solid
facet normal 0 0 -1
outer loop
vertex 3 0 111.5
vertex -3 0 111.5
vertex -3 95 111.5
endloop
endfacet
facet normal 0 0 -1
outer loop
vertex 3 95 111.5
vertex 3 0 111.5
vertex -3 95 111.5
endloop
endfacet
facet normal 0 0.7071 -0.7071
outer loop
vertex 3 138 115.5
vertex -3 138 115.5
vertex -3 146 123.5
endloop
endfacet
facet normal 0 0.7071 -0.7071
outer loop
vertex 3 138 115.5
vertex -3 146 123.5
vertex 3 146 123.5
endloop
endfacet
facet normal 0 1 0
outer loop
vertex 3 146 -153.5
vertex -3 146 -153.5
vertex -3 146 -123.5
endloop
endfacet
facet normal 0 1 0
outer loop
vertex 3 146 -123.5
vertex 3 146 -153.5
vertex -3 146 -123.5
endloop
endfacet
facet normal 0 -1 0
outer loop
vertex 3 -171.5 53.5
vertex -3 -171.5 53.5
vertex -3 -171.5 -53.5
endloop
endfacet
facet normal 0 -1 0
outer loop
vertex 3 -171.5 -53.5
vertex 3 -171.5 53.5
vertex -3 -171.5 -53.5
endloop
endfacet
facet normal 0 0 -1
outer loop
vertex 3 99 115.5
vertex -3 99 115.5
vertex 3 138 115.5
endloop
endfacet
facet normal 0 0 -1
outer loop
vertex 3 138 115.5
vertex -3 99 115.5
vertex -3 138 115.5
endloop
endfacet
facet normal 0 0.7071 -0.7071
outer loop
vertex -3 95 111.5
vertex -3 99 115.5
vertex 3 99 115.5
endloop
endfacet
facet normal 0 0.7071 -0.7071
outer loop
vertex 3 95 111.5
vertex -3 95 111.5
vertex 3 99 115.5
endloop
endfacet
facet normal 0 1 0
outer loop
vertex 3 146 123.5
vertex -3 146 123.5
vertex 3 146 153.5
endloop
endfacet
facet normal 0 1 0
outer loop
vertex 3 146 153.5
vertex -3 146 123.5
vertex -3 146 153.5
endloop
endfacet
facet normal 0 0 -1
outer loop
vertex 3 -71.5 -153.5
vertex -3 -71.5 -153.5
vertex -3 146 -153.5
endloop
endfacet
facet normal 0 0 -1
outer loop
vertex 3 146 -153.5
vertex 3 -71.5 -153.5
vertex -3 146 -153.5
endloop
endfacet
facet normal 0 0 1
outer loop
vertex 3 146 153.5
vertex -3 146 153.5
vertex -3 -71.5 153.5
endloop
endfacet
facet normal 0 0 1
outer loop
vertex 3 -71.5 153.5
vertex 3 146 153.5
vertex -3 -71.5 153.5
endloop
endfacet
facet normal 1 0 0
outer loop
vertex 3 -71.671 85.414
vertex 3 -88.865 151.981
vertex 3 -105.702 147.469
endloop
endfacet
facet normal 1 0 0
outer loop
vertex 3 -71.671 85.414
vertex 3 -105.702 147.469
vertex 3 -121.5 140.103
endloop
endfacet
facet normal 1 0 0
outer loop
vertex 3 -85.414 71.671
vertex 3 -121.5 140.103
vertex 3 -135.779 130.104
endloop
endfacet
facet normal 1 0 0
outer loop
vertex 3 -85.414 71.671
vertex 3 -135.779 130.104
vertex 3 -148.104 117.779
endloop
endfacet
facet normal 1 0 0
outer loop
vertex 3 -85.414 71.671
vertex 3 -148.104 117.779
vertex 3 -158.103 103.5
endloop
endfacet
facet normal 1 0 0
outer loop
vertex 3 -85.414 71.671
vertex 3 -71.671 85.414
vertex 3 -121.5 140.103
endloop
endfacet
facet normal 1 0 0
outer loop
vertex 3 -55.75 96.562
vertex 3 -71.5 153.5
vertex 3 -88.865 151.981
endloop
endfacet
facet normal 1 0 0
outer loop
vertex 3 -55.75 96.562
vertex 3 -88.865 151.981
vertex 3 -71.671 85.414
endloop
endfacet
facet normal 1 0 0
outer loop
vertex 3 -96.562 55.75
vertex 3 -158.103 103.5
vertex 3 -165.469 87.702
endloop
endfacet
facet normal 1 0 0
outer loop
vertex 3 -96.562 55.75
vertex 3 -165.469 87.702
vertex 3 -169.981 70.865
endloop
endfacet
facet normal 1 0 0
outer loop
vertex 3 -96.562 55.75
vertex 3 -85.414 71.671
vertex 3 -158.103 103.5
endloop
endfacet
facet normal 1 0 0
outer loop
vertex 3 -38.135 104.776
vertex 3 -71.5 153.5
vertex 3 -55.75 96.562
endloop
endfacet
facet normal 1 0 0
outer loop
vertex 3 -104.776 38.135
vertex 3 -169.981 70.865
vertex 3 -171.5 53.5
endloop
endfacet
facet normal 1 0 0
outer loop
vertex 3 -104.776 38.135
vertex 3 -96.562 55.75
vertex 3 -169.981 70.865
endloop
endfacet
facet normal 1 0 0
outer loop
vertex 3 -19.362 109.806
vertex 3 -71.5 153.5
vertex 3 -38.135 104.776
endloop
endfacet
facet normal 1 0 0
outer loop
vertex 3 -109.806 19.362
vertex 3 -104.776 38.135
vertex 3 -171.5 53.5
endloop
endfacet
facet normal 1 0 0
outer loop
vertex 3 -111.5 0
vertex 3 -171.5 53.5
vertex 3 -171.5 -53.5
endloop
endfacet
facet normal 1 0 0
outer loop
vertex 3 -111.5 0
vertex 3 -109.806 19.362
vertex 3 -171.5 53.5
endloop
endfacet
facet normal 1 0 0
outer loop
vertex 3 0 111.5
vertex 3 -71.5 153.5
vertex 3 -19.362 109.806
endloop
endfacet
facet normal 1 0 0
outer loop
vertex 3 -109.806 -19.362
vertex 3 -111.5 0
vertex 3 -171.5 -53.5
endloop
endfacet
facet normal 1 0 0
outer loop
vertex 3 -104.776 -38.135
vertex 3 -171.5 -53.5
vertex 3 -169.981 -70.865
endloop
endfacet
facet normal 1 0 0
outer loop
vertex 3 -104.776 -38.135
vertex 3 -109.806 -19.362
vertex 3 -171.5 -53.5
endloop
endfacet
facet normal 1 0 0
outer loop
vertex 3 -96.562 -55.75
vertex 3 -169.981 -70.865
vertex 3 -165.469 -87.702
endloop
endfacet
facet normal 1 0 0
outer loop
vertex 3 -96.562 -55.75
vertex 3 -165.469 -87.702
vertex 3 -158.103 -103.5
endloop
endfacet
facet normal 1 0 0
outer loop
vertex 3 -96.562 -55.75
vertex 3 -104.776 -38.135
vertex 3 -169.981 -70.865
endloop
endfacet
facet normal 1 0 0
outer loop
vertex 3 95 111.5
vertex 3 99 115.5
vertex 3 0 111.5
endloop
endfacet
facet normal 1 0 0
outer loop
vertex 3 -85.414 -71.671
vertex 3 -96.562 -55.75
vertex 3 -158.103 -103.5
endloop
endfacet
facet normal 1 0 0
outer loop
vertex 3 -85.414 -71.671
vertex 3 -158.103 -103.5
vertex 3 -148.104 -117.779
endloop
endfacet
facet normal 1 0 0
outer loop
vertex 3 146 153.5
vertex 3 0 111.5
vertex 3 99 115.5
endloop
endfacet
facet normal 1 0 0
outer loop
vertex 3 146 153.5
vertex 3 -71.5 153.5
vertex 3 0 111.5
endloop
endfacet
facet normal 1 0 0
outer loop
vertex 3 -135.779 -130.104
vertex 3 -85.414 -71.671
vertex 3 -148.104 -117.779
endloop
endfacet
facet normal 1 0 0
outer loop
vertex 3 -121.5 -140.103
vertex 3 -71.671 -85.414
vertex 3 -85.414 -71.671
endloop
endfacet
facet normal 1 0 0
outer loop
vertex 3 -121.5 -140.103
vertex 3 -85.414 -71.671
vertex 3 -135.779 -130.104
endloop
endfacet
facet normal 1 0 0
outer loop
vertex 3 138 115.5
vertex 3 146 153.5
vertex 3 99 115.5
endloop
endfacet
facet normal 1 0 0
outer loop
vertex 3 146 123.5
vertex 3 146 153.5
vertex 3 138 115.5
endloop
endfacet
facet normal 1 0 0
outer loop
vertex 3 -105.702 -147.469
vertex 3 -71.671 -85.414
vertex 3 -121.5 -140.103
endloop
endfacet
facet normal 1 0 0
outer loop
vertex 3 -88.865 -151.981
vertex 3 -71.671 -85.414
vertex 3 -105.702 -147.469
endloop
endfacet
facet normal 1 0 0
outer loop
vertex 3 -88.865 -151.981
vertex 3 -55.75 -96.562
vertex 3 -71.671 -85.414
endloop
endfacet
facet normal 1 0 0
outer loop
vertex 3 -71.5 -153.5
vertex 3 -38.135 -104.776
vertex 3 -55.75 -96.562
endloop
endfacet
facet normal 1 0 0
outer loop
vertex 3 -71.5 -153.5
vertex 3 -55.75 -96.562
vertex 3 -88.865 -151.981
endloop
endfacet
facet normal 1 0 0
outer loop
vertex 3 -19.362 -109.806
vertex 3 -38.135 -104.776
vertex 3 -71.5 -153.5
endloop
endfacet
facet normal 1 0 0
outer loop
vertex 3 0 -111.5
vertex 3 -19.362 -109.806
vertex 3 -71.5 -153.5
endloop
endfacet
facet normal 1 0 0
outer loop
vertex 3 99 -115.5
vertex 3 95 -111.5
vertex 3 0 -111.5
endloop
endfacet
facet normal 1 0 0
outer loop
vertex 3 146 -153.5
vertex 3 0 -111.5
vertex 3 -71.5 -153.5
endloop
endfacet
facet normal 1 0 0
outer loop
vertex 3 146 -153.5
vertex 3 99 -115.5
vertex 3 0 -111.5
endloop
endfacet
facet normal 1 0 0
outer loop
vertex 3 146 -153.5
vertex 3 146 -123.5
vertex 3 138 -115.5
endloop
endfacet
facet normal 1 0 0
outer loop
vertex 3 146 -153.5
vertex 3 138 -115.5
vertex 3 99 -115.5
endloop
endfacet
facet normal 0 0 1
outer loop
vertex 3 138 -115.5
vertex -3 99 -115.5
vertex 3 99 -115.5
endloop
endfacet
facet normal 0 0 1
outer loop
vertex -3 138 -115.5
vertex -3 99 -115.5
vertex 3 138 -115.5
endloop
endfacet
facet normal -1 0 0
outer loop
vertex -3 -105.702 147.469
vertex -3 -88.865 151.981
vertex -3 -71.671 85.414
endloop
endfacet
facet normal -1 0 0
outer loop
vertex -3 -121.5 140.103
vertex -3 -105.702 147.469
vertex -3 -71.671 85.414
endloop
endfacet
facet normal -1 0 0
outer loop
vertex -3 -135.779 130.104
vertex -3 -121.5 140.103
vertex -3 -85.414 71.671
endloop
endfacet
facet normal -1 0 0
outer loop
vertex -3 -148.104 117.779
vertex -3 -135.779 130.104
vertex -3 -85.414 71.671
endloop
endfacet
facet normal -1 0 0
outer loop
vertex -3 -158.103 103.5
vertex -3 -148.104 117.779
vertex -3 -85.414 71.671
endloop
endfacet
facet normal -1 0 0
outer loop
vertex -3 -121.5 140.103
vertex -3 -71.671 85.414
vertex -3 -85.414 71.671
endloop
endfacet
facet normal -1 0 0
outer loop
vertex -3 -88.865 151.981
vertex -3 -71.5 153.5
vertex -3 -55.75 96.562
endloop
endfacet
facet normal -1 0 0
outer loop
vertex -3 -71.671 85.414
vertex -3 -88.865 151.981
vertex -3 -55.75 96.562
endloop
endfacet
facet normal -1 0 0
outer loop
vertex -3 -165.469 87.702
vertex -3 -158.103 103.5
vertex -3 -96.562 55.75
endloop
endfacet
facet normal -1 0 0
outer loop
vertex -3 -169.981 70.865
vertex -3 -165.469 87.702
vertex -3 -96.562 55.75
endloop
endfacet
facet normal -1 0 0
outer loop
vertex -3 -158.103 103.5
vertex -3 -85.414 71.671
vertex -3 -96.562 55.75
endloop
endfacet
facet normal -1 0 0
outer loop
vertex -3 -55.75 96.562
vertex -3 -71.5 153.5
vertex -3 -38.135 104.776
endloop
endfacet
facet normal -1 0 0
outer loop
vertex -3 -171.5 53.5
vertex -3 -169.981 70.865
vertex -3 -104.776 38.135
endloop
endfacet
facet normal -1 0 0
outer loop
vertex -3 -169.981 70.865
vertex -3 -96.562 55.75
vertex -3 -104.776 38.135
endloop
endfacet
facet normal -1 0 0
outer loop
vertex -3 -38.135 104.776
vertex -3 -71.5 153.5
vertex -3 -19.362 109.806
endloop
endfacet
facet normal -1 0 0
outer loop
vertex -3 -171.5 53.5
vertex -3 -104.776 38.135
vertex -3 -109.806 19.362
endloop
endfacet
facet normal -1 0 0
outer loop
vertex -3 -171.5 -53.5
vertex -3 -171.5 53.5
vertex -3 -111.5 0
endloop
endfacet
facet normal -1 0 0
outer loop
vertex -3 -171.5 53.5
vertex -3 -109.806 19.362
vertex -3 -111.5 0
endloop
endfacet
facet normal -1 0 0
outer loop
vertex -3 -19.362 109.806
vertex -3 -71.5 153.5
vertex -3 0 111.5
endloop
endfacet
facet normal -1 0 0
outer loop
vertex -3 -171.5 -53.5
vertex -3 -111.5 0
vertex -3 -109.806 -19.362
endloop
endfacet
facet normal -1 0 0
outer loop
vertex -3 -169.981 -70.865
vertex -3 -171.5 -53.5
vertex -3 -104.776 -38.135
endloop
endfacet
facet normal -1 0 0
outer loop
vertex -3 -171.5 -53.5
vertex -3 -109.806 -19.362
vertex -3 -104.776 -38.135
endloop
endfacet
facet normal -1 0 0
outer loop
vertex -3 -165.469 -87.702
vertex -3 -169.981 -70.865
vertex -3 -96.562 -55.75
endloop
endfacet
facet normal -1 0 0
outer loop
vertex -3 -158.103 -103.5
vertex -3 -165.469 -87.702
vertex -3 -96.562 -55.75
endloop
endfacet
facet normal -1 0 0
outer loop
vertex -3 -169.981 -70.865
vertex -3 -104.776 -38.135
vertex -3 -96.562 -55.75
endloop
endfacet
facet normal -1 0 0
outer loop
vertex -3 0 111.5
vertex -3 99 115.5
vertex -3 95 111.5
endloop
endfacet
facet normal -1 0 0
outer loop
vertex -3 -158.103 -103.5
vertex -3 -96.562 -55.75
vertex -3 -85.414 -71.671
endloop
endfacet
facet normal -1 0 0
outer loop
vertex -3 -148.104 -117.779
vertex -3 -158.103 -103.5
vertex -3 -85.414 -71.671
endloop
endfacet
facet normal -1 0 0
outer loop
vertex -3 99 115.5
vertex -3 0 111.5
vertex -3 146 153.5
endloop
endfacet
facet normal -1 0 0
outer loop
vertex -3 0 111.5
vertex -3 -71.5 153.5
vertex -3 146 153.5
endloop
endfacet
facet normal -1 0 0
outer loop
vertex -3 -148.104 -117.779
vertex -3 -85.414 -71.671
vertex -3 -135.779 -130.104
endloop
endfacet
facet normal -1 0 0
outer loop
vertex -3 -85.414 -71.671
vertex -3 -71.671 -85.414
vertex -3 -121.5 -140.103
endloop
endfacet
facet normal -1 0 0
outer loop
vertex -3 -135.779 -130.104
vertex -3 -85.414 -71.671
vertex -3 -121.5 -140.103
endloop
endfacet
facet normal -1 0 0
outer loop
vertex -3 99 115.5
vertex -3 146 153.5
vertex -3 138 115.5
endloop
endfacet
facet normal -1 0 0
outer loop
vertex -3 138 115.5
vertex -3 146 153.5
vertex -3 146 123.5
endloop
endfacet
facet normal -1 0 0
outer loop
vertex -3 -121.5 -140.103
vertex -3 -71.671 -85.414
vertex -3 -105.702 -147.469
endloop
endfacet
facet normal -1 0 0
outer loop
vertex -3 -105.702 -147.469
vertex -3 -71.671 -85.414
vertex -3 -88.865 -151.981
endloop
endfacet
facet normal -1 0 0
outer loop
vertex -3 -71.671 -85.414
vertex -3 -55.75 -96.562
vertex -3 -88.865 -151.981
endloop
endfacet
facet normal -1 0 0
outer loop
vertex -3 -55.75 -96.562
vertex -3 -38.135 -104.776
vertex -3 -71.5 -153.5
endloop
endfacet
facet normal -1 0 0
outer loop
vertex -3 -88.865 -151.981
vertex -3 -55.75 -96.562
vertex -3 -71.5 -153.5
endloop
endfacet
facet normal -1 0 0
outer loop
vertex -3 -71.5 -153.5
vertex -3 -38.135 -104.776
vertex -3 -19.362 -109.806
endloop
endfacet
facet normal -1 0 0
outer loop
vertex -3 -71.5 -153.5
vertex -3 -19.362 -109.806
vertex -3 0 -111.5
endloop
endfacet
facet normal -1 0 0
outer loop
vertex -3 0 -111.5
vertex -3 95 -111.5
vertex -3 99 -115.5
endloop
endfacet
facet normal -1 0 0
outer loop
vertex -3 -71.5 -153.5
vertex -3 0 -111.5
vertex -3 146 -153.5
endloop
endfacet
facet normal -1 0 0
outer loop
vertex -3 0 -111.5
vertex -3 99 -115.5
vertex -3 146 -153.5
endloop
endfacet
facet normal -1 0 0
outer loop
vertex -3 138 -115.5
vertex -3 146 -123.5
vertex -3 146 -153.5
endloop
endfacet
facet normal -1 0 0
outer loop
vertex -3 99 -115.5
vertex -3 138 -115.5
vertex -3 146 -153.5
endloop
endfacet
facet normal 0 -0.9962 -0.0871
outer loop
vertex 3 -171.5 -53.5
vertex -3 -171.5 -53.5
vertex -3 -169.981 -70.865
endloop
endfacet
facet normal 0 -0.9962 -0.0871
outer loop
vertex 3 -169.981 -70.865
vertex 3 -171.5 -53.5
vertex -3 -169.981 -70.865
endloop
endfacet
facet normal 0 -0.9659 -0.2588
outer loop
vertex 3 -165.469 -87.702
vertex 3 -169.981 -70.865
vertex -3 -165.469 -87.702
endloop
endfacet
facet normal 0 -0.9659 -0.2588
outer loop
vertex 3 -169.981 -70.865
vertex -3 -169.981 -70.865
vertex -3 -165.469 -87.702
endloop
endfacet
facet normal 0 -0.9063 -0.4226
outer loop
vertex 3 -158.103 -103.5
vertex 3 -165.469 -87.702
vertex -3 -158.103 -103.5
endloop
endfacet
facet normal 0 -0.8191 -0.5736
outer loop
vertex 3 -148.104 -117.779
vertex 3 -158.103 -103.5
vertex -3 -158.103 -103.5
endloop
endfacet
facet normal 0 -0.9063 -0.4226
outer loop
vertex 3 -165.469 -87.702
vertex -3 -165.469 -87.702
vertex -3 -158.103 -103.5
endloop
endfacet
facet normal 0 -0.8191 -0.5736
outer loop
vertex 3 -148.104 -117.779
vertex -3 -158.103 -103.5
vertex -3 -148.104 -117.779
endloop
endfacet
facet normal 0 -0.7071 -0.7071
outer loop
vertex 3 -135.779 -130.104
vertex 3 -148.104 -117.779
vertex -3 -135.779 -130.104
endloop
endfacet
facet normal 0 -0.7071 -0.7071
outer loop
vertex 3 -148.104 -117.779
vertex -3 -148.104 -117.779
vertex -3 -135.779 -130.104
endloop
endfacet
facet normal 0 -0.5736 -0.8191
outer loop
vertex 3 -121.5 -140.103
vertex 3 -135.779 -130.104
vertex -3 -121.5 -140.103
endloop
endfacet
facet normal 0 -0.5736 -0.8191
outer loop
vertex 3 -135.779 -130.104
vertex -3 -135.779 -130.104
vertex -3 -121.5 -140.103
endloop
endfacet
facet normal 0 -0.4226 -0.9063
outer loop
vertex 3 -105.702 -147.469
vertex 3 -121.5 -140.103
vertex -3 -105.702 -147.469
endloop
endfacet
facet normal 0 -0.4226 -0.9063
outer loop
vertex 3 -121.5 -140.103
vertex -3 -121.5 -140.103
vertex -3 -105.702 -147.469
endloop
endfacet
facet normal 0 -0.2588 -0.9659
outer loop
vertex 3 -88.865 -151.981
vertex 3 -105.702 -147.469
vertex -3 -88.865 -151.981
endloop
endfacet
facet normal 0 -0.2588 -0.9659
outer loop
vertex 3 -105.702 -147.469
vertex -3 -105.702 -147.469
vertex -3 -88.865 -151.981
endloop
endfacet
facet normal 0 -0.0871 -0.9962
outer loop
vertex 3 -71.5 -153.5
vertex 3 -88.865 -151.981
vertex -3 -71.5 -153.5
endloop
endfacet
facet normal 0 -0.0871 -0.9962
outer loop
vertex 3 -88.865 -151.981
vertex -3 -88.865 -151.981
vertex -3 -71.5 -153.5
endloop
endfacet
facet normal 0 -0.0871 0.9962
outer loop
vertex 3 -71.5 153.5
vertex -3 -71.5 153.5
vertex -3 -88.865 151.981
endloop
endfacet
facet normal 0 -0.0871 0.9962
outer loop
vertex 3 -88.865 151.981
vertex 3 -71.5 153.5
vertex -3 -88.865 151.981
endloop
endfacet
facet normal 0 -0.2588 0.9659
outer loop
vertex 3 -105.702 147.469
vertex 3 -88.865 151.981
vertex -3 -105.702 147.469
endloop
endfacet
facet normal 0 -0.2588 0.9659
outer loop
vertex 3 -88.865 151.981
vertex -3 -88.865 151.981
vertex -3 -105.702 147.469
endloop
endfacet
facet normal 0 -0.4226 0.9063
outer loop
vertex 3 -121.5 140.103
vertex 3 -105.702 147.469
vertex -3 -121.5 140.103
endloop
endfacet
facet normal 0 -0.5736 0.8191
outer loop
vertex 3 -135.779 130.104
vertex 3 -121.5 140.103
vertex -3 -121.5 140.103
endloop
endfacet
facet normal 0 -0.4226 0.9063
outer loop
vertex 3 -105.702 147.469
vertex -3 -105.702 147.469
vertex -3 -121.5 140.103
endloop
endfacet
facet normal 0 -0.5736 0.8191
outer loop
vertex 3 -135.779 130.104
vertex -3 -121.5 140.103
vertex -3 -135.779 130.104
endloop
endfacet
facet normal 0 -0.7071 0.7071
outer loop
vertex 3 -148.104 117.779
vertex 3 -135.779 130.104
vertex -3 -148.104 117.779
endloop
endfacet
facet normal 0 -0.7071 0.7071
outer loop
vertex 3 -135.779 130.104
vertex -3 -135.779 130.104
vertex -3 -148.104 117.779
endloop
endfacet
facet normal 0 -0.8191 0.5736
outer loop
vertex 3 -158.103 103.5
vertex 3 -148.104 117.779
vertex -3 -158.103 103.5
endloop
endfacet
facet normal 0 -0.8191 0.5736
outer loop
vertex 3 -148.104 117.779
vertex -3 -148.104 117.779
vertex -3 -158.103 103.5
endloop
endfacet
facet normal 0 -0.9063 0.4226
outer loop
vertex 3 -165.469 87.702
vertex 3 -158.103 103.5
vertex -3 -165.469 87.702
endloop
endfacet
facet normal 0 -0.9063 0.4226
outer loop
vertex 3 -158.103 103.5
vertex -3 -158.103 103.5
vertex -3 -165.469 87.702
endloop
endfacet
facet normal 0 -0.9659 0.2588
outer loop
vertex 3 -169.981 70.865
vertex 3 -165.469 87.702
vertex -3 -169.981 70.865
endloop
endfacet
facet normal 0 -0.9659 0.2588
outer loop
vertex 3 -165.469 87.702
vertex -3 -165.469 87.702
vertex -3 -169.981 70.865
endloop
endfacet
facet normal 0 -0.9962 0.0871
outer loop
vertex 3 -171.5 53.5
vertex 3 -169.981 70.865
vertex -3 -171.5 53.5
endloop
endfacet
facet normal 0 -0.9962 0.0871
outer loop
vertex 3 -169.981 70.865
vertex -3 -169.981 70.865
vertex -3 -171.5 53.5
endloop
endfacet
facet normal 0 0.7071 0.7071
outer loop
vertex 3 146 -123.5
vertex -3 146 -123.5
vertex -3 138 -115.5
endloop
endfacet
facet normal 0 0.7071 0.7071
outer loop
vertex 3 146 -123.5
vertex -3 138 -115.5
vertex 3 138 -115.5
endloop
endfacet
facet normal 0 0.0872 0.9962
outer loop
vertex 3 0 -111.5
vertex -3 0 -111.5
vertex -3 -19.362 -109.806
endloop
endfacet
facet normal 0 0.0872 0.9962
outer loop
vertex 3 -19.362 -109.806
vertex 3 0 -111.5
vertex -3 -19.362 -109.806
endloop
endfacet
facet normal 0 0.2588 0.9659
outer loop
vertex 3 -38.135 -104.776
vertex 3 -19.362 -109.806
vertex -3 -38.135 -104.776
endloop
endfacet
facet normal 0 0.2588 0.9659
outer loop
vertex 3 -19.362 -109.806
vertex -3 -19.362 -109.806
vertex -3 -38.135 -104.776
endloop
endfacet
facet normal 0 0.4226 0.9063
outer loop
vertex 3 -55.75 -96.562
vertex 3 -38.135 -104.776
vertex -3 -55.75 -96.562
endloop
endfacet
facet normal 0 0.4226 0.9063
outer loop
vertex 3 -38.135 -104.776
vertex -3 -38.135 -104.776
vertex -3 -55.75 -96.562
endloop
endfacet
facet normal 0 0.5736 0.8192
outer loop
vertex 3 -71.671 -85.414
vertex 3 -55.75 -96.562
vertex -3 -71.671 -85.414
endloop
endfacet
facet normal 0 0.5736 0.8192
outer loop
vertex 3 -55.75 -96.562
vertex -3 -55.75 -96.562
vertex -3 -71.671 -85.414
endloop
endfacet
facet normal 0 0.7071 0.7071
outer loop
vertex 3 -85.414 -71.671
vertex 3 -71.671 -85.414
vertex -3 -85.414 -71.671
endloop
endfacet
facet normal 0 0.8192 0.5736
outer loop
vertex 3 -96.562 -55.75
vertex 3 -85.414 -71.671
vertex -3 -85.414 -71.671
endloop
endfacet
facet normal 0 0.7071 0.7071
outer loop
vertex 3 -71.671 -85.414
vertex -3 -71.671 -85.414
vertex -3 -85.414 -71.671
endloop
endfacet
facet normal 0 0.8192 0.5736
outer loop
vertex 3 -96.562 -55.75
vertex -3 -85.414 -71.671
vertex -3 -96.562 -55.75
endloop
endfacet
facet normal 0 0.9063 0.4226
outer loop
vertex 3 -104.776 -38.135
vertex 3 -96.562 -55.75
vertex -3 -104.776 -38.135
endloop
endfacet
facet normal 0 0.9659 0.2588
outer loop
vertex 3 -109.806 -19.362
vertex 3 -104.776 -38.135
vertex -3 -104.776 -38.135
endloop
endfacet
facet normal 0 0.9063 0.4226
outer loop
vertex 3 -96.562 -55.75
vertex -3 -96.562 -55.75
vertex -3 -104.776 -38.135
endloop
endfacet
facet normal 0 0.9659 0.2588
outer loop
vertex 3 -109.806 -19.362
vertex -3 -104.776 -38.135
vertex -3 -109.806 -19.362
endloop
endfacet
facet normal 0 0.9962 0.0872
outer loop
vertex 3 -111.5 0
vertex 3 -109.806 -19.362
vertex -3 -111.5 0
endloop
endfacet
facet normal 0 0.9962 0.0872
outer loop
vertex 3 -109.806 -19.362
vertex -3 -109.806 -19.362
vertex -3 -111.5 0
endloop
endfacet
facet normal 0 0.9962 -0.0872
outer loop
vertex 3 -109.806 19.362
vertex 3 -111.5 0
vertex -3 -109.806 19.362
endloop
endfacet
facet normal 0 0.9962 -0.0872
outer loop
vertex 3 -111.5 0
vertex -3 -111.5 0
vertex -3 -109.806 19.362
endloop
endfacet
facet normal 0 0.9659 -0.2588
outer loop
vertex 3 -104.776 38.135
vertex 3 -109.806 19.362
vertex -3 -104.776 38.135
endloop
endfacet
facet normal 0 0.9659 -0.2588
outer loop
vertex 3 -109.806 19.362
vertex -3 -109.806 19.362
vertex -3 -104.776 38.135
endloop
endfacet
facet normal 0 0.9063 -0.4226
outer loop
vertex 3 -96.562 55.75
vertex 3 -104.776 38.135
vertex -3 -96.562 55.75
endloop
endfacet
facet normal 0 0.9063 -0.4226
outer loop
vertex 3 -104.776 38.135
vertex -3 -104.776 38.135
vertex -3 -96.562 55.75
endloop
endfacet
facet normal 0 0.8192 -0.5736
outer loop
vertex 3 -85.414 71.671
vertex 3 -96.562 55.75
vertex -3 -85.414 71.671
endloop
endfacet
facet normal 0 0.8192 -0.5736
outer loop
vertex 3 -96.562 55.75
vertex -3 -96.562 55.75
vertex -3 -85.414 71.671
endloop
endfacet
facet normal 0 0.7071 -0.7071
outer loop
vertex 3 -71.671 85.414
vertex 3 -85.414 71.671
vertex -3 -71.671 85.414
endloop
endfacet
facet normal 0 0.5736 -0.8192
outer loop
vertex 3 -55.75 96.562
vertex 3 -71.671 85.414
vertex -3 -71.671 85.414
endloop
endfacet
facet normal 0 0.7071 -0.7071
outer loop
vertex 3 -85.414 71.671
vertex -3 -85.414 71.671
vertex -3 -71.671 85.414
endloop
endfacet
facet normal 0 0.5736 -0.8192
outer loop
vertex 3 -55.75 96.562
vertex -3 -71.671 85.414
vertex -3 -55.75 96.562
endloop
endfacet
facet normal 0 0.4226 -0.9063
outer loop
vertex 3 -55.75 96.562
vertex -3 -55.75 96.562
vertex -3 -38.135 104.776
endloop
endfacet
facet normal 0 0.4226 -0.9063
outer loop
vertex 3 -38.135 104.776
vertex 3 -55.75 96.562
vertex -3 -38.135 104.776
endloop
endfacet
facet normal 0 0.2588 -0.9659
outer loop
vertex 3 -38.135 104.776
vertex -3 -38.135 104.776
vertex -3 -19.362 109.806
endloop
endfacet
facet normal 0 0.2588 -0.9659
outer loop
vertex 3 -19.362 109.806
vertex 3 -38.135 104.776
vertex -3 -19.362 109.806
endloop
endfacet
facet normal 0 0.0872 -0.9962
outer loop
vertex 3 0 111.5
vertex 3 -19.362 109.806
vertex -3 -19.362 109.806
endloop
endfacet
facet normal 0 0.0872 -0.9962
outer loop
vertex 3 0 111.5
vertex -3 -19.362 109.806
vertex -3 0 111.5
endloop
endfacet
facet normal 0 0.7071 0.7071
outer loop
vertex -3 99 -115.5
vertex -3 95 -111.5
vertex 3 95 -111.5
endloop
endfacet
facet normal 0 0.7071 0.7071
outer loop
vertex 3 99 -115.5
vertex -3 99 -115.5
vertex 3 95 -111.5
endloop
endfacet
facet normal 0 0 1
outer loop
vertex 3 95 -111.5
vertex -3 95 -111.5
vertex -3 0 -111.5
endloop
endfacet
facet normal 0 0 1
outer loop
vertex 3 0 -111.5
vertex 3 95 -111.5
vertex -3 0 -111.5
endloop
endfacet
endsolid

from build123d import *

# Parameters (mm, degrees)
SM_START                 = -3
SM_BASE_FLANGE_1_DEPTH   = 6
CUT_EXTRUDE_1_DEPTH      = 231.181450165
CUT_EXTRUDE_1_DEPTH_BACK = 231.181450165
SKETCH_7_W               = 4
SKETCH_7_H               = 47
CHAMFER_2_SIZE           = 8
CHAMFER_3_SIZE           = 4


# Read off the part's stored shape, not the designer's step: Базовая кромка1
with BuildPart() as part:
    # Базовая кромка1 outline → Базовая кромка1 (new body)
    with BuildSketch(Plane(origin=(0, 0, 0), x_dir=(0, 0, -1), z_dir=(1, 0, 0)).offset(SM_START)):
        with BuildLine():
            Line((-111.5, 0), (-111.5, 146))
            Line((-111.5, 146), (-153.5, 146))
            Line((-153.5, 146), (-153.5, -71.5))
            ThreePointArc((-153.5, -71.5), (-124.210678119, -142.210678119), (-53.5, -171.5))
            Line((-53.5, -171.5), (53.5, -171.5))
            ThreePointArc((53.5, -171.5), (124.210678119, -142.210678119), (153.5, -71.5))
            Line((153.5, -71.5), (153.5, 146))
            Line((153.5, 146), (111.5, 146))
            Line((111.5, 146), (111.5, 0))
            ThreePointArc((111.5, 0), (0, -111.5), (-111.5, 0))
        make_face()
    extrude(amount=SM_BASE_FLANGE_1_DEPTH)

    # Эскиз7 → Вырез-Вытянуть1 (cut, two sides: drawn at the far end of the back side and taken through both)
    with BuildSketch(Plane(origin=(0, 0, 0), x_dir=(0, 0, -1), z_dir=(1, 0, 0)).offset(-CUT_EXTRUDE_1_DEPTH_BACK)):
        with Locations((-113.5, 122.5)):
            Rectangle(SKETCH_7_W, SKETCH_7_H)
        with Locations((113.5, 122.5)):
            Rectangle(SKETCH_7_W, SKETCH_7_H)
    extrude(amount=CUT_EXTRUDE_1_DEPTH + CUT_EXTRUDE_1_DEPTH_BACK, mode=Mode.SUBTRACT)

    # Фаска2
    chamfer_2_edges = [part.edges().sort_by_distance(p)[0] for p in [
        (0, 146, 115.5),
        (0, 146, -115.5),
    ]]
    chamfer(chamfer_2_edges, length=CHAMFER_2_SIZE)

    # Фаска3
    chamfer_3_edges = [part.edges().sort_by_distance(p)[0] for p in [
        (0, 99, -111.5),
        (0, 99, 111.5),
    ]]
    chamfer(chamfer_3_edges, length=CHAMFER_3_SIZE - 0.0001)  # a hair under: the kernel refuses the full size


solid = part.part
